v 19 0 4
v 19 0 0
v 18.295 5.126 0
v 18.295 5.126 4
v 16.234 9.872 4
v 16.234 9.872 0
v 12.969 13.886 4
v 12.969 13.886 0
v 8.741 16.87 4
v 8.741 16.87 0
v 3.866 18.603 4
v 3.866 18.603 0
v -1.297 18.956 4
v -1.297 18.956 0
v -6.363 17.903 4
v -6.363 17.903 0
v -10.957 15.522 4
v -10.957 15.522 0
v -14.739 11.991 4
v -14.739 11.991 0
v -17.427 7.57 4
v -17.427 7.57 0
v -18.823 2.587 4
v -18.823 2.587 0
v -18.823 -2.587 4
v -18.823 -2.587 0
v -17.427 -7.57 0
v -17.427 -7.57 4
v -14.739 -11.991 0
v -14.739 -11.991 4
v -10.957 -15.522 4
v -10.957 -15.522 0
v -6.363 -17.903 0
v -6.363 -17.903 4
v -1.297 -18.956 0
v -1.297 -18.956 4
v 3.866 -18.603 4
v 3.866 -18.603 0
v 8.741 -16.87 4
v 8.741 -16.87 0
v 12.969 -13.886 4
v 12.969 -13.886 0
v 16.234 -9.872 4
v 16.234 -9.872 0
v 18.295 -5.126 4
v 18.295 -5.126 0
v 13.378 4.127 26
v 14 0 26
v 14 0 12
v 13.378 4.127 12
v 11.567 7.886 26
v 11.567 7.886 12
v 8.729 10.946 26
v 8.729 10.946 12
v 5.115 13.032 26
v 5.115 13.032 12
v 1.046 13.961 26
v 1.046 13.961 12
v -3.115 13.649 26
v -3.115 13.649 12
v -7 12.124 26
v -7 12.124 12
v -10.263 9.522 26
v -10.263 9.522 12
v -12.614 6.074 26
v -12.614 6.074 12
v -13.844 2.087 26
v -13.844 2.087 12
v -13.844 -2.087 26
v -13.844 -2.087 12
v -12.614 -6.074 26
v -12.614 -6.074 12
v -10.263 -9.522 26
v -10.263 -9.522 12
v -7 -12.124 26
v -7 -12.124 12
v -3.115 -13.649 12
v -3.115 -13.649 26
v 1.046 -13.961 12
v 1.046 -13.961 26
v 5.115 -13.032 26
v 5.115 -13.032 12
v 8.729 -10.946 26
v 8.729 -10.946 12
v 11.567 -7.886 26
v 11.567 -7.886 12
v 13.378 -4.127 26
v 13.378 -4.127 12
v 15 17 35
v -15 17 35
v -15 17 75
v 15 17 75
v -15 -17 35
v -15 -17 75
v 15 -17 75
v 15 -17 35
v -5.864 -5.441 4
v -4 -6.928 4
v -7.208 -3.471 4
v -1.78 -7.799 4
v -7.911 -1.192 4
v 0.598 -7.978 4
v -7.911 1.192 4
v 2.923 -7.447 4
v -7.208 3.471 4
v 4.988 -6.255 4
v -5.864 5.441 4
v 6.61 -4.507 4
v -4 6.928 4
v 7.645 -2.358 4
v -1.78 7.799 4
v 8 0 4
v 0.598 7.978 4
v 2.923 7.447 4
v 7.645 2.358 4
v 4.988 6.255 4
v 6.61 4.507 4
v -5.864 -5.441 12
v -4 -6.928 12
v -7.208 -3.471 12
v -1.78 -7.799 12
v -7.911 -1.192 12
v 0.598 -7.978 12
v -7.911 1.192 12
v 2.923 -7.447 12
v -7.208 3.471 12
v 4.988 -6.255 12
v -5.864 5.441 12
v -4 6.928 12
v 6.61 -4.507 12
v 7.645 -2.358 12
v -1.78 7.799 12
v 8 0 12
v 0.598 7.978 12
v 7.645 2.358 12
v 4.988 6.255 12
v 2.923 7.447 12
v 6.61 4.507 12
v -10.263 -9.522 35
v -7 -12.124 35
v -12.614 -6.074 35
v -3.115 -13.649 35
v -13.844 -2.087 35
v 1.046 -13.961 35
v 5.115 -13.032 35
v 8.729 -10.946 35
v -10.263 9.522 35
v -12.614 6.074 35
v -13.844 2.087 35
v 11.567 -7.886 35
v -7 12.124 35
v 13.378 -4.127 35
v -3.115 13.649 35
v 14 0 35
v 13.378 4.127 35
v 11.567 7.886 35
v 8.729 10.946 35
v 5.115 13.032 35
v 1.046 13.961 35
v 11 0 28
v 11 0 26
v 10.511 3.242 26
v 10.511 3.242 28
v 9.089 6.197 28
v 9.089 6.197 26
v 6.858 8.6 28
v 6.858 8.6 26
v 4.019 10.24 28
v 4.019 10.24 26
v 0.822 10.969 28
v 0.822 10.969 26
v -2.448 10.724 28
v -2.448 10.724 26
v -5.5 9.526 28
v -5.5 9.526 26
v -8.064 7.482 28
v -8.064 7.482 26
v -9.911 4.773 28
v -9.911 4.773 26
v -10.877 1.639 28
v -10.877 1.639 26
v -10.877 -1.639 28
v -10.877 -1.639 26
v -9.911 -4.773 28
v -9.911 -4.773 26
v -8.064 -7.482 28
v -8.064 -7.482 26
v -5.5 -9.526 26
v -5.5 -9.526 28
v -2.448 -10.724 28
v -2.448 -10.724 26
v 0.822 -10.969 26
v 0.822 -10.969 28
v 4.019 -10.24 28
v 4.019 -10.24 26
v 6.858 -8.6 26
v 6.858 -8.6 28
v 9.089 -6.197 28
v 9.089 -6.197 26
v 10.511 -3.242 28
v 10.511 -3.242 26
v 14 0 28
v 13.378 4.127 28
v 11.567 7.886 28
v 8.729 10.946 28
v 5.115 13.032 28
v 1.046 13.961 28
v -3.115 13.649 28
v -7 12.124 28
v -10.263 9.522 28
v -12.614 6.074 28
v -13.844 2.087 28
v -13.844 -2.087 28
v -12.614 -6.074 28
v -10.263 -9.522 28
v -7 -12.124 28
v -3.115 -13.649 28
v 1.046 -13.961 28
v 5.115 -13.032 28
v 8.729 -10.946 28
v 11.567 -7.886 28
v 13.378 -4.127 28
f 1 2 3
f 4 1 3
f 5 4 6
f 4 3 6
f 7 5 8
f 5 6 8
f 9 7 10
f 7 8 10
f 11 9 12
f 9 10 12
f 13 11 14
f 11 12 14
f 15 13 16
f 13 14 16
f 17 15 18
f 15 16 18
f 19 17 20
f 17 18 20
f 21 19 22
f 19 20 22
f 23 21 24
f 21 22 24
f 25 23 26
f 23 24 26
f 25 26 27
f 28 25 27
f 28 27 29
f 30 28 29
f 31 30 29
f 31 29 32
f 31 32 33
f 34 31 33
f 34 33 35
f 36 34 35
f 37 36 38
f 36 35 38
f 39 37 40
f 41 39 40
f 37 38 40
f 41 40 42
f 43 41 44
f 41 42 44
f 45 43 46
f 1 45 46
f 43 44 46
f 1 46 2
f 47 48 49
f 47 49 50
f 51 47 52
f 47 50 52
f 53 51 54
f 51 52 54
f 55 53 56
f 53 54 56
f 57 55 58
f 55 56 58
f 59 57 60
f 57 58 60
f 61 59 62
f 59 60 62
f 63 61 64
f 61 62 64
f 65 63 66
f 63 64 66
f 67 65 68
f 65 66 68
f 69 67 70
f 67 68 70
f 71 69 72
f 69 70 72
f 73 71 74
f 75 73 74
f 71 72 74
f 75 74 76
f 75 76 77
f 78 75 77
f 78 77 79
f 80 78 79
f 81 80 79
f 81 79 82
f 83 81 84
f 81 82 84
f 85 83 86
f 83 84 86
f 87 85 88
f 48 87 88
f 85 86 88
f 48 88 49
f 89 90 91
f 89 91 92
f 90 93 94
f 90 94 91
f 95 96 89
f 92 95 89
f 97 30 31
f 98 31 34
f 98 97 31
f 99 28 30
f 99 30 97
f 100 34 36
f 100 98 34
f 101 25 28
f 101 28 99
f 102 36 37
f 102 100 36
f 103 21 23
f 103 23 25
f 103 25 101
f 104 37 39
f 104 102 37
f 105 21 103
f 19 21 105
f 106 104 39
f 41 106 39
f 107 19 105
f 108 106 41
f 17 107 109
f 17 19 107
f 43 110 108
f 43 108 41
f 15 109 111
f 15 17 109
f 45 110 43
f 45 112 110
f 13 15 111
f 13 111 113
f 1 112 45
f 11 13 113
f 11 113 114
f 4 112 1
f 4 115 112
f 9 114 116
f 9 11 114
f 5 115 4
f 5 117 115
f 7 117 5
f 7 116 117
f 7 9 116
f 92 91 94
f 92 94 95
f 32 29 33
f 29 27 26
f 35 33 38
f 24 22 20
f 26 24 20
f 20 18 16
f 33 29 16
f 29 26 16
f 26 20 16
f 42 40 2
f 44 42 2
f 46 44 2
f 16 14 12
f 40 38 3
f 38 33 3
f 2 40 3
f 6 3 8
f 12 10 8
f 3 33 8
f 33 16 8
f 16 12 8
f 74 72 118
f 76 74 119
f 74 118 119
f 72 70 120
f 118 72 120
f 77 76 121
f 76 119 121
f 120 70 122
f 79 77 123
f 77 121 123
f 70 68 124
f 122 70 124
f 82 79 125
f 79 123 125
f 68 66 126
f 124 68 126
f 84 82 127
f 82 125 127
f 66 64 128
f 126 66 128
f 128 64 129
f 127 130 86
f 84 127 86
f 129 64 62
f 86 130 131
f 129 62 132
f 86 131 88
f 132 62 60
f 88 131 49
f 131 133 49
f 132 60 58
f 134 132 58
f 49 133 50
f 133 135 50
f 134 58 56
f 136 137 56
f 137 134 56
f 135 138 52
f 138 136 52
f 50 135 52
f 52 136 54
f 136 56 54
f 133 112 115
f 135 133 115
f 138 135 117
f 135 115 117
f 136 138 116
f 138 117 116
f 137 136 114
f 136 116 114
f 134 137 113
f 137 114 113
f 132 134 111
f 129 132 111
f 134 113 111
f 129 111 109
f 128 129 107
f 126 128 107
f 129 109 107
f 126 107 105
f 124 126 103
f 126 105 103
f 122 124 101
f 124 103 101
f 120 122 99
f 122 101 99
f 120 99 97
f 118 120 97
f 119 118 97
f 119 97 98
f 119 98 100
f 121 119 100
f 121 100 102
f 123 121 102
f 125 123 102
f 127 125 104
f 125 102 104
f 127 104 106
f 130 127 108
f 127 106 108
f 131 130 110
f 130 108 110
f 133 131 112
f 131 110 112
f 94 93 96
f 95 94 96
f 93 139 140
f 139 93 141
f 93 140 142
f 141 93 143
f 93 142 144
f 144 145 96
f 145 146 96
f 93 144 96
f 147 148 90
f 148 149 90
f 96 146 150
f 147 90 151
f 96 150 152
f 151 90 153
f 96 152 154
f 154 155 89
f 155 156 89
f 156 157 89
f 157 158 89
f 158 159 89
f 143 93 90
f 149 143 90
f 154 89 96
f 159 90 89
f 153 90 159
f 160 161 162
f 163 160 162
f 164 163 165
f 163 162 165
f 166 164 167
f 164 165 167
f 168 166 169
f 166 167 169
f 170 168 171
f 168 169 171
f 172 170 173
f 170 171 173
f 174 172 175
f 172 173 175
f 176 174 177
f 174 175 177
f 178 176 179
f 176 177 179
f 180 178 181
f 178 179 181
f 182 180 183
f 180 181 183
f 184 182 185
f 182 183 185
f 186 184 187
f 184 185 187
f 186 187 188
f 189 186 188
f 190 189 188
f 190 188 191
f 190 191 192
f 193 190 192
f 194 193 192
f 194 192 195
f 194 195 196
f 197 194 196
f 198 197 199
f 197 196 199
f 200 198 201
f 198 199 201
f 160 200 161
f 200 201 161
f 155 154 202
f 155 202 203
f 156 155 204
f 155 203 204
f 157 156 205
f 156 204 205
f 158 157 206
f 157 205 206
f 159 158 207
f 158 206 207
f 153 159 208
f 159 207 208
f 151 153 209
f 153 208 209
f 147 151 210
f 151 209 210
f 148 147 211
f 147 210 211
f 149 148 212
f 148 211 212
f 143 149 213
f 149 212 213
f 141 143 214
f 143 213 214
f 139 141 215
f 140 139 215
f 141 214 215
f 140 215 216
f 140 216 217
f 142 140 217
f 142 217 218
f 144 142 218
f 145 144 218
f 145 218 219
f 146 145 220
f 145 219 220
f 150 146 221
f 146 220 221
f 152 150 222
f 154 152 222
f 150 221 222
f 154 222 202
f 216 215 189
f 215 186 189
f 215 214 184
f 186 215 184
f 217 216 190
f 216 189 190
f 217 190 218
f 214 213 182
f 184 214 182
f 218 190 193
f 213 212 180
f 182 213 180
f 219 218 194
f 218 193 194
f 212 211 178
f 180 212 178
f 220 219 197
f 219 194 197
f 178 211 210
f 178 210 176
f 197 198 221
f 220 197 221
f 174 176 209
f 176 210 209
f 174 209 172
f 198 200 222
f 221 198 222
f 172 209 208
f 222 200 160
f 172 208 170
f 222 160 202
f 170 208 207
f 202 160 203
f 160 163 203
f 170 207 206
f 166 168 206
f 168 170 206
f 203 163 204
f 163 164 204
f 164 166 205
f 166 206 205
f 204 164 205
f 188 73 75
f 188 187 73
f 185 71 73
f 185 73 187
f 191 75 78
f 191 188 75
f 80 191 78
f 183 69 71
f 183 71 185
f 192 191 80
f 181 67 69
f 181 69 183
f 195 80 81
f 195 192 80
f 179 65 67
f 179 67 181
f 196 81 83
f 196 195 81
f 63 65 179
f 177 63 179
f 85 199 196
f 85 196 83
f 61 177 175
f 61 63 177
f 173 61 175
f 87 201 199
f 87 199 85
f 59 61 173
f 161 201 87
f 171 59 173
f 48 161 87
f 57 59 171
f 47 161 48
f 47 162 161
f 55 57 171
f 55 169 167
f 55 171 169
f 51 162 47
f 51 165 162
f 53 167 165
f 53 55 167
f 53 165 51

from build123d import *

# Parameters (mm, degrees)
SKETCH_1_R      = 19
EXTRUDE_1_DEPTH = 4
SKETCH_2_R      = 8
EXTRUDE_2_DEPTH = 8
SKETCH_3_R      = 14
EXTRUDE_3_DEPTH = 14
SKETCH_4_R      = 11
EXTRUDE_4_DEPTH = 2
SKETCH_5_R      = 14
EXTRUDE_5_DEPTH = 7
SKETCH_6_W      = 30
SKETCH_6_H      = 34
EXTRUDE_6_DEPTH = 40


with BuildPart() as part:
    # 草图1 → 凸台-拉伸1 (new body)
    with BuildSketch(Plane.XY):
        Circle(SKETCH_1_R)
    extrude(amount=EXTRUDE_1_DEPTH)

    # 草图2 → 凸台-拉伸2 (add)
    with BuildSketch(Plane.XY.offset(4)):
        Circle(SKETCH_2_R)
    extrude(amount=EXTRUDE_2_DEPTH)

    # 草图3 → 凸台-拉伸3 (add)
    with BuildSketch(Plane.XY.offset(12)):
        Circle(SKETCH_3_R)
    extrude(amount=EXTRUDE_3_DEPTH)

    # 草图4 → 凸台-拉伸4 (add)
    with BuildSketch(Plane.XY.offset(26)):
        Circle(SKETCH_4_R)
    extrude(amount=EXTRUDE_4_DEPTH)

    # 草图5 → 凸台-拉伸5 (add)
    with BuildSketch(Plane.XY.offset(28)):
        Circle(SKETCH_5_R)
    extrude(amount=EXTRUDE_5_DEPTH)

    # 草图6 → 凸台-拉伸6 (add)
    with BuildSketch(Plane.XY.offset(35)):
        Rectangle(SKETCH_6_W, SKETCH_6_H)
    extrude(amount=EXTRUDE_6_DEPTH)


solid = part.part
